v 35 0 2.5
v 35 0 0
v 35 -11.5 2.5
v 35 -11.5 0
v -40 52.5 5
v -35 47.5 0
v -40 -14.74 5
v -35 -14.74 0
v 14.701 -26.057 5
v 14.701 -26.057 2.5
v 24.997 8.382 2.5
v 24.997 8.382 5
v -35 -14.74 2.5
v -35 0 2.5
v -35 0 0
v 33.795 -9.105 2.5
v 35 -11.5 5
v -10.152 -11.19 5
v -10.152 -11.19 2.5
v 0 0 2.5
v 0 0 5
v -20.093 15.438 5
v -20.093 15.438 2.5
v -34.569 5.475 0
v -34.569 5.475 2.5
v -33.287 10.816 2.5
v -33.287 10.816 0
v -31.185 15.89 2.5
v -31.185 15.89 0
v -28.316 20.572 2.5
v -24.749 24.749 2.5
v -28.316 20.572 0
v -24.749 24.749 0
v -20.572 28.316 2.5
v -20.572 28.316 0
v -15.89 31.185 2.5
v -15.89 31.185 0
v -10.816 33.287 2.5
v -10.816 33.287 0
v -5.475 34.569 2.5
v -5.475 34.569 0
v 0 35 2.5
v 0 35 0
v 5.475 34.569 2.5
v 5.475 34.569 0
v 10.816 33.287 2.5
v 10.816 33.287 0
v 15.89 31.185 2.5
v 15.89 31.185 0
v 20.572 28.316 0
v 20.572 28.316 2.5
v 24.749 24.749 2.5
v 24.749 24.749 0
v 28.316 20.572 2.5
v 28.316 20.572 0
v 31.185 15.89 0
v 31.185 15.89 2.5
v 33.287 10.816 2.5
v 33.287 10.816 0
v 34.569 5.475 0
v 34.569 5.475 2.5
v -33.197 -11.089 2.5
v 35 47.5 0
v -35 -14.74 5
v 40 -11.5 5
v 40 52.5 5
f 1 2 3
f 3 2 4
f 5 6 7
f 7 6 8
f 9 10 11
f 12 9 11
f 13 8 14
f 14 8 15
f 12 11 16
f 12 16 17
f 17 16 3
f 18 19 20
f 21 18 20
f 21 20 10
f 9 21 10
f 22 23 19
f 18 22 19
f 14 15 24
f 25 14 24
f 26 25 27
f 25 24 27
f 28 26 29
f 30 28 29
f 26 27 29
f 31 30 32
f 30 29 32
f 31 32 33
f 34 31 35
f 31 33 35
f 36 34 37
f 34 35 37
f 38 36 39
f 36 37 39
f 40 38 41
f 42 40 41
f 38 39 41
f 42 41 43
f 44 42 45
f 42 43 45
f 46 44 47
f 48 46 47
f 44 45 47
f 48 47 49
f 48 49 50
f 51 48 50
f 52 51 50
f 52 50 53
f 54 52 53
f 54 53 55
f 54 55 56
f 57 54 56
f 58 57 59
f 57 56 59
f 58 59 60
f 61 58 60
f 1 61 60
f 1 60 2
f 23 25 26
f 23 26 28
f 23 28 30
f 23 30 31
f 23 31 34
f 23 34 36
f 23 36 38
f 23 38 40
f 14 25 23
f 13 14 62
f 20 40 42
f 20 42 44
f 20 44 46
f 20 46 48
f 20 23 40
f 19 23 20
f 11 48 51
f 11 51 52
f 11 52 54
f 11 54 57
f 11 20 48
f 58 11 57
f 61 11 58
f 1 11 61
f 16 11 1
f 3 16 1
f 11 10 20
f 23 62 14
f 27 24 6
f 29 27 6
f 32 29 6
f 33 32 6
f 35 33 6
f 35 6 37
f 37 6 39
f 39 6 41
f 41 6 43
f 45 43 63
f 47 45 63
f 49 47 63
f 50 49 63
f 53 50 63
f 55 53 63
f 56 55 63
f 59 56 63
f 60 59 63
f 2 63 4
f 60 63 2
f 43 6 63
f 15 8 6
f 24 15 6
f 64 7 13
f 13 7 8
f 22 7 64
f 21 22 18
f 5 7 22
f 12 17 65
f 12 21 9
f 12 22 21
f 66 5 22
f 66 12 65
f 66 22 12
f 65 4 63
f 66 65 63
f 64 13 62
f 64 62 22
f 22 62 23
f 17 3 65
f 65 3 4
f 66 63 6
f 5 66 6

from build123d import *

# Parameters (mm, degrees)
F1_DEPTH = 5
F2_SIZE  = 4.99999
F4_DEPTH = 2.5


# Not quite as in the source:
# - a fillet or chamfer is up to 0.001 mm smaller than in the source, because OpenCascade refuses the exact size


with BuildPart() as f1:
    # F0 (on Top) → F1 (new body)
    with BuildSketch(Plane.XY):
        Polygon((24.9973740429, 8.3822524399), (35, -11.5), (35, 47.5), (-35, 47.5), (-35, -14.74), (-20.0927332044, 15.4384202456), (-10.1515629949, -11.1895798258), (0, 0), (14.7012080997, -26.056649141), align=None)
        Polygon((35, 47.5), (35, -11.5), (40, -11.5), (40, 52.5), (-40, 52.5), (-40, -14.74), (-35, -14.74), (-35, 47.5), align=None)
    extrude(amount=F1_DEPTH)

    # F2 (size 5 in the source; OpenCascade refuses exactly that, so slightly less here)
    f2_edges = [f1.edges().sort_by_distance(p)[0] for p in [
        (40, 20.5, 0),
        (0, 52.5, 0),
        (-40, 18.88, 0),
    ]]
    chamfer(f2_edges, length=F2_SIZE)

    # F3 (on face) → F4 (cut)
    with BuildSketch(Plane(origin=(0, 0, 0), x_dir=(1, 0, 0), z_dir=(0, 0, -1))):
        with BuildLine():
            ThreePointArc((33.7950026252, 9.1048227638), (34.6974429309, 4.5921078013), (35, 0))
            Line((35, 0), (35, 11.5))
            Line((35, 11.5), (33.7950026252, 9.1048227638))
        make_face()
        with BuildLine():
            Line((-35, 14.74), (-35, 0))
            ThreePointArc((-35, 0), (-34.5462442763, 5.6175623185), (-33.1967424913, 11.0894674339))
            Line((-33.1967424913, 11.0894674339), (-35, 14.74))
        make_face()
        with BuildLine():
            ThreePointArc((-33.1967424913, 11.0894674339), (-34.5462442763, 5.6175623185), (-35, 0))
            ThreePointArc((-35, 0), (0, -35), (35, 0))
            ThreePointArc((35, 0), (34.6974429309, 4.5921078013), (33.7950026252, 9.1048227638))
            Line((33.7950026252, 9.1048227638), (24.9973740429, -8.3822524399))
            Line((24.9973740429, -8.3822524399), (14.7012080997, 26.056649141))
            Line((14.7012080997, 26.056649141), (0, 0))
            Line((0, 0), (-10.1515629949, 11.1895798258))
            Line((-10.1515629949, 11.1895798258), (-20.0927332044, -15.4384202456))
            Line((-20.0927332044, -15.4384202456), (-33.1967424913, 11.0894674339))
        make_face()
    extrude(amount=-F4_DEPTH, mode=Mode.SUBTRACT)


solid = f1.part
